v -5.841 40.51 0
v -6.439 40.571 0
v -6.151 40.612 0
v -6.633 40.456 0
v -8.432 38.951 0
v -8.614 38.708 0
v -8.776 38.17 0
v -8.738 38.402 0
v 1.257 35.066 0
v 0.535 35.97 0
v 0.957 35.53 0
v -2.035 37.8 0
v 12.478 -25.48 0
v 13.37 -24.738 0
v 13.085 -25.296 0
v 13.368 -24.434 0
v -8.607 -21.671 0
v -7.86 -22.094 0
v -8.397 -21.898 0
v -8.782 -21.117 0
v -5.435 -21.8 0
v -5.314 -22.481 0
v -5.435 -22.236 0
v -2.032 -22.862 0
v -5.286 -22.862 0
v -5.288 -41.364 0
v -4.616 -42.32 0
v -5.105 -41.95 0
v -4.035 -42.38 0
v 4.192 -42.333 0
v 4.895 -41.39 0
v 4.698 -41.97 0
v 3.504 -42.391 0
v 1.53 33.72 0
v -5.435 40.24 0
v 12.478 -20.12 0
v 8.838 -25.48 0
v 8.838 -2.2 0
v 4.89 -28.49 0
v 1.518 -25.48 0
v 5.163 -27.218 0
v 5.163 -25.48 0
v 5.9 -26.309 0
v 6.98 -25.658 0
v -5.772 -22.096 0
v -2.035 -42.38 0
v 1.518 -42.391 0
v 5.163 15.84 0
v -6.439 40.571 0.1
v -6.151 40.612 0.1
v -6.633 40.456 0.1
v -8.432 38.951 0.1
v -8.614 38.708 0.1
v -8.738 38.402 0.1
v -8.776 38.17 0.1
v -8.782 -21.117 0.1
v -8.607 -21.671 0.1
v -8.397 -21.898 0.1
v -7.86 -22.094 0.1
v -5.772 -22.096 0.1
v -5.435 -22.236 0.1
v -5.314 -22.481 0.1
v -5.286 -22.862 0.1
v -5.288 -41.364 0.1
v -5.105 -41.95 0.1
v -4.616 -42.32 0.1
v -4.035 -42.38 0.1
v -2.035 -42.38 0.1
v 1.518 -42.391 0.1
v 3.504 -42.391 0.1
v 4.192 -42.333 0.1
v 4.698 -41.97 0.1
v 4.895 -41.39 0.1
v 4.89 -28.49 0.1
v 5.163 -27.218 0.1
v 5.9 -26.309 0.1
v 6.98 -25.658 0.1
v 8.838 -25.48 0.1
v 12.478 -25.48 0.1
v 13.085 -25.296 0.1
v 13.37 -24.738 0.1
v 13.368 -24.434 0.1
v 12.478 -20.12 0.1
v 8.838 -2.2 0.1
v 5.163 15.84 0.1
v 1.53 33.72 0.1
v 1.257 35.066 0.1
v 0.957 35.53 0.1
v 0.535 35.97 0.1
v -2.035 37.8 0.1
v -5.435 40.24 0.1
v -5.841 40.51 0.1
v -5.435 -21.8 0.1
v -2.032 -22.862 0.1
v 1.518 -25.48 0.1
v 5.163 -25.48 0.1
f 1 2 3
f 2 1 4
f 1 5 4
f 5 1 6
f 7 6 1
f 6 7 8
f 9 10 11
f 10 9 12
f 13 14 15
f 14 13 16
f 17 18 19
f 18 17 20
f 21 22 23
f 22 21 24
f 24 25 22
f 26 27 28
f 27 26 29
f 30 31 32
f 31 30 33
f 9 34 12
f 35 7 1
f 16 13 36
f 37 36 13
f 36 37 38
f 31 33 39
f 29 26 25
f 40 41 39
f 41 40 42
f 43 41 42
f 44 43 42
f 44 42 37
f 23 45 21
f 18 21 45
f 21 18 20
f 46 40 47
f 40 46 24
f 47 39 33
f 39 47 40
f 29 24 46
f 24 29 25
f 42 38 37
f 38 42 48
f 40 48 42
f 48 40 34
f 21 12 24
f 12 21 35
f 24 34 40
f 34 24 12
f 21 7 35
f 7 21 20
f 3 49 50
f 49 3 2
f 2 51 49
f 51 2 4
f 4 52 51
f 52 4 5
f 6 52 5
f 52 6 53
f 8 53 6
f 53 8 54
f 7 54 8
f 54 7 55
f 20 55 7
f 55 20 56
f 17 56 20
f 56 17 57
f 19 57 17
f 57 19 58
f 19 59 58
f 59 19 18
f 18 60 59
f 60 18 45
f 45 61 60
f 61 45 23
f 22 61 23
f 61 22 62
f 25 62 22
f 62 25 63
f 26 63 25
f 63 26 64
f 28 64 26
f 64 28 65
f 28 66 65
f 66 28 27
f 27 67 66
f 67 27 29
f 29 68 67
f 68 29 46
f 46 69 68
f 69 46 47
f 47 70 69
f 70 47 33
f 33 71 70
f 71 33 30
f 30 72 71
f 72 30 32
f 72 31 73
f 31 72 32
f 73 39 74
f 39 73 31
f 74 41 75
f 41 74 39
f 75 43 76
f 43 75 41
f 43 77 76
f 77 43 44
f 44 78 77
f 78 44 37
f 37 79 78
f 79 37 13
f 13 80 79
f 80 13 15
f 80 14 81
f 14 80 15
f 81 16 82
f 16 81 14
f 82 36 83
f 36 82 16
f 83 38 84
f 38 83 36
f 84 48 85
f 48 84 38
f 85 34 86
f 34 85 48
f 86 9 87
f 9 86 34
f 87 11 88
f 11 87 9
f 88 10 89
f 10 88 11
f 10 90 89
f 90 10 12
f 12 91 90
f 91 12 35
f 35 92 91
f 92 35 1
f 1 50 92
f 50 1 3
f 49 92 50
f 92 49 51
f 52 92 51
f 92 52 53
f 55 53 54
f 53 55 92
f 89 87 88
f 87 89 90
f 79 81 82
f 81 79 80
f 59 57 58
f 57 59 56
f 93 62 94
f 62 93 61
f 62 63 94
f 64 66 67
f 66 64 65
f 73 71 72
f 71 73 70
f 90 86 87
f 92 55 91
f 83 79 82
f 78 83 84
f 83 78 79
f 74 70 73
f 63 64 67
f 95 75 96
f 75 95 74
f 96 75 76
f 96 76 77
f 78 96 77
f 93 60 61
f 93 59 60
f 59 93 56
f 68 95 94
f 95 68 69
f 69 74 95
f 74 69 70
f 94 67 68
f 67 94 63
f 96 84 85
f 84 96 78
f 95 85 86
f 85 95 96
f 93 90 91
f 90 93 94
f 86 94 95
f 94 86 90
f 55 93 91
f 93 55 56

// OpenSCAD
// file: s/13710gs02.scad
use <../../lib.scad>
function ldraw_lib__s__13710gs02() = [
// 0 ~Sticker Top for Technic Panel Fairing Smooth (Long) Flat
// 0 Name: s\13710gs02.dat
// 0 Author: Philippe Hurbain [Philo]
// 0 !LDRAW_ORG Subpart UPDATE 2022-02
// 0 !LICENSE Licensed under CC BY 2.0 and CC BY 4.0 : see CAreadme.txt
// 
// 0 BFC CERTIFY CCW
  [0,"BFC","CERTIFY"],
  [0,"BFC","CCW"],
// 
// 0 !HISTORY 2022-03-06 [PTadmin] Official Update 2022-02
// 
// 
// 0 // Top surface
// 4 16 -14.602 -0.25 101.275 -15.378 -0.25 101.529 -16.097 -0.25 101.427 -16.582 -0.25 101.141
  [4,16,-14.602,-0.25,101.275,-15.378,-0.25,101.529,-16.097,-0.25,101.427,-16.582,-0.25,101.141],
// 4 16 -14.602 -0.25 101.275 -16.582 -0.25 101.141 -21.08 -0.25 97.378 -21.536 -0.25 96.769
  [4,16,-14.602,-0.25,101.275,-16.582,-0.25,101.141,-21.08,-0.25,97.378,-21.536,-0.25,96.769],
// 4 16 -14.602 -0.25 101.275 -21.536 -0.25 96.769 -21.844 -0.25 96.005 -21.94 -0.25 95.424
  [4,16,-14.602,-0.25,101.275,-21.536,-0.25,96.769,-21.844,-0.25,96.005,-21.94,-0.25,95.424],
// 4 16 3.142 -0.25 87.664 2.393 -0.25 88.826 1.338 -0.25 89.925 -5.087 -0.25 94.5
  [4,16,3.142,-0.25,87.664,2.393,-0.25,88.826,1.338,-0.25,89.925,-5.087,-0.25,94.5],
// 4 16 31.196 -0.25 -63.7 32.713 -0.25 -63.241 33.424 -0.25 -61.844 33.421 -0.25 -61.086
  [4,16,31.196,-0.25,-63.7,32.713,-0.25,-63.241,33.424,-0.25,-61.844,33.421,-0.25,-61.086],
// 4 16 -21.954 -0.25 -52.792 -21.518 -0.25 -54.177 -20.993 -0.25 -54.745 -19.65 -0.25 -55.236
  [4,16,-21.954,-0.25,-52.792,-21.518,-0.25,-54.177,-20.993,-0.25,-54.745,-19.65,-0.25,-55.236],
// 4 16 -13.588 -0.25 -55.589 -13.286 -0.25 -56.203 -5.08 -0.25 -57.154 -13.588 -0.25 -54.5
  [4,16,-13.588,-0.25,-55.589,-13.286,-0.25,-56.203,-5.08,-0.25,-57.154,-13.588,-0.25,-54.5],
// 3 16 -13.286 -0.25 -56.203 -13.216 -0.25 -57.156 -5.08 -0.25 -57.154
  [3,16,-13.286,-0.25,-56.203,-13.216,-0.25,-57.156,-5.08,-0.25,-57.154],
// 4 16 -13.22 -0.25 -103.409 -12.762 -0.25 -104.875 -11.54 -0.25 -105.799 -10.088 -0.25 -105.95
  [4,16,-13.22,-0.25,-103.409,-12.762,-0.25,-104.875,-11.54,-0.25,-105.799,-10.088,-0.25,-105.95],
// 4 16 8.76 -0.25 -105.977 10.481 -0.25 -105.833 11.744 -0.25 -104.924 12.237 -0.25 -103.474
  [4,16,8.76,-0.25,-105.977,10.481,-0.25,-105.833,11.744,-0.25,-104.924,12.237,-0.25,-103.474],
// 3 16 -5.087 -0.25 94.5 3.826 -0.25 84.3 3.142 -0.25 87.664
  [3,16,-5.087,-0.25,94.5,3.826,-0.25,84.3,3.142,-0.25,87.664],
// 3 16 -14.602 -0.25 101.275 -21.94 -0.25 95.424 -13.588 -0.25 100.6
  [3,16,-14.602,-0.25,101.275,-21.94,-0.25,95.424,-13.588,-0.25,100.6],
// 3 16 31.196 -0.25 -50.3 31.196 -0.25 -63.7 33.421 -0.25 -61.086
  [3,16,31.196,-0.25,-50.3,31.196,-0.25,-63.7,33.421,-0.25,-61.086],
// 4 16 22.095 -0.25 -63.7 31.196 -0.25 -63.7 31.196 -0.25 -50.3 22.095 -0.25 -5.5
  [4,16,22.095,-0.25,-63.7,31.196,-0.25,-63.7,31.196,-0.25,-50.3,22.095,-0.25,-5.5],
// 3 16 12.225 -0.25 -71.225 8.76 -0.25 -105.977 12.237 -0.25 -103.474
  [3,16,12.225,-0.25,-71.225,8.76,-0.25,-105.977,12.237,-0.25,-103.474],
// 3 16 -13.216 -0.25 -57.156 -13.22 -0.25 -103.409 -10.088 -0.25 -105.95
  [3,16,-13.216,-0.25,-57.156,-13.22,-0.25,-103.409,-10.088,-0.25,-105.95],
// 4 16 3.795 -0.25 -63.7 12.225 -0.25 -71.225 12.908 -0.25 -68.044 12.908 -0.25 -63.7
  [4,16,3.795,-0.25,-63.7,12.225,-0.25,-71.225,12.908,-0.25,-68.044,12.908,-0.25,-63.7],
// 3 16 12.908 -0.25 -63.7 12.908 -0.25 -68.044 14.749 -0.25 -65.772
  [3,16,12.908,-0.25,-63.7,12.908,-0.25,-68.044,14.749,-0.25,-65.772],
// 3 16 12.908 -0.25 -63.7 14.749 -0.25 -65.772 17.451 -0.25 -64.144
  [3,16,12.908,-0.25,-63.7,14.749,-0.25,-65.772,17.451,-0.25,-64.144],
// 3 16 22.095 -0.25 -63.7 12.908 -0.25 -63.7 17.451 -0.25 -64.144
  [3,16,22.095,-0.25,-63.7,12.908,-0.25,-63.7,17.451,-0.25,-64.144],
// 3 16 -13.588 -0.25 -54.5 -14.429 -0.25 -55.241 -13.588 -0.25 -55.589
  [3,16,-13.588,-0.25,-54.5,-14.429,-0.25,-55.241,-13.588,-0.25,-55.589],
// 4 16 -19.65 -0.25 -55.236 -14.429 -0.25 -55.241 -13.588 -0.25 -54.5 -21.954 -0.25 -52.792
  [4,16,-19.65,-0.25,-55.236,-14.429,-0.25,-55.241,-13.588,-0.25,-54.5,-21.954,-0.25,-52.792],
// 4 16 -5.08 -0.25 -57.154 -5.087 -0.25 -105.95 3.795 -0.25 -105.977 3.795 -0.25 -63.7
  [4,16,-5.08,-0.25,-57.154,-5.087,-0.25,-105.95,3.795,-0.25,-105.977,3.795,-0.25,-63.7],
// 4 16 3.795 -0.25 -63.7 3.795 -0.25 -105.977 8.76 -0.25 -105.977 12.225 -0.25 -71.225
  [4,16,3.795,-0.25,-63.7,3.795,-0.25,-105.977,8.76,-0.25,-105.977,12.225,-0.25,-71.225],
// 4 16 -10.088 -0.25 -105.95 -5.087 -0.25 -105.95 -5.08 -0.25 -57.154 -13.216 -0.25 -57.156
  [4,16,-10.088,-0.25,-105.95,-5.087,-0.25,-105.95,-5.08,-0.25,-57.154,-13.216,-0.25,-57.156],
// 4 16 12.908 -0.25 -63.7 22.095 -0.25 -63.7 22.095 -0.25 -5.5 12.908 -0.25 39.6
  [4,16,12.908,-0.25,-63.7,22.095,-0.25,-63.7,22.095,-0.25,-5.5,12.908,-0.25,39.6],
// 4 16 3.795 -0.25 -63.7 12.908 -0.25 -63.7 12.908 -0.25 39.6 3.826 -0.25 84.3
  [4,16,3.795,-0.25,-63.7,12.908,-0.25,-63.7,12.908,-0.25,39.6,3.826,-0.25,84.3],
// 4 16 -5.087 -0.25 94.5 -13.588 -0.25 100.6 -13.588 -0.25 -54.5 -5.08 -0.25 -57.154
  [4,16,-5.087,-0.25,94.5,-13.588,-0.25,100.6,-13.588,-0.25,-54.5,-5.08,-0.25,-57.154],
// 4 16 3.826 -0.25 84.3 -5.087 -0.25 94.5 -5.08 -0.25 -57.154 3.795 -0.25 -63.7
  [4,16,3.826,-0.25,84.3,-5.087,-0.25,94.5,-5.08,-0.25,-57.154,3.795,-0.25,-63.7],
// 4 16 -13.588 -0.25 100.6 -21.94 -0.25 95.424 -21.954 -0.25 -52.792 -13.588 -0.25 -54.5
  [4,16,-13.588,-0.25,100.6,-21.94,-0.25,95.424,-21.954,-0.25,-52.792,-13.588,-0.25,-54.5],
];
module ldraw_lib__s__13710gs02(step=0, col=false, unit=2/5, alt=false, line=0.2, solid=!$preview)
    makepoly(ldraw_lib__s__13710gs02(), step=step, col=col, unit=unit, alt=alt, line=line, solid=solid);
ldraw_lib__s__13710gs02(line=0.2);
// main file
use <../lib.scad>
use <s/13710gs01.scad>
use <s/13710gs02.scad>
function ldraw_lib__13710m() = [
// 0 Sticker Mindstorms EV3 #13 for Panel Smooth Long (Needs Work)
// 0 Name: 13710m.dat
// 0 Author: Philippe Hurbain [Philo]
// 0 !LDRAW_ORG Part UPDATE 2022-02
// 0 !LICENSE Licensed under CC BY 2.0 and CC BY 4.0 : see CAreadme.txt
// 
// 0 !HELP To be used with panel 64393
// 
// 0 BFC CERTIFY CCW
  [0,"BFC","CERTIFY"],
  [0,"BFC","CCW"],
// 
// 0 !HISTORY 2022-03-06 [PTadmin] Official Update 2022-02
// 
// 
// 0 // Image file courtesy of the LEGO MINDSTORMS Team
// 0 // Needs Work: Missing more detailed fallback pattern
// 
// 1 16 0 0 0 1 0 0 0 1 0 0 0 1 s\13710gs01.dat
  [1,16,0,0,0,1,0,0,0,1,0,0,0,1, ldraw_lib__s__13710gs01()],
// 0 !TEXMAP START PLANAR 33.424 12.0264 101.529 33.424 12.0264 -105.977 -21.954 12.0264 101.529 13710m.png
// 0 !: 1 15 0 0 0 1 0 0 0 1 0 0 0 1 s\13710gs02.dat
// 0 !TEXMAP FALLBACK
// 1 15 0 0 0 1 0 0 0 1 0 0 0 1 s\13710gs02.dat
  [1,15,0,0,0,1,0,0,0,1,0,0,0,1, ldraw_lib__s__13710gs02()],
// 0 !TEXMAP END
];
module ldraw_lib__13710m(step=0, col=false, unit=2/5, alt=false, line=0.2, solid=!$preview)
    makepoly(ldraw_lib__13710m(), step=step, col=col, unit=unit, alt=alt, line=line, solid=solid);
ldraw_lib__13710m(line=0.2);
